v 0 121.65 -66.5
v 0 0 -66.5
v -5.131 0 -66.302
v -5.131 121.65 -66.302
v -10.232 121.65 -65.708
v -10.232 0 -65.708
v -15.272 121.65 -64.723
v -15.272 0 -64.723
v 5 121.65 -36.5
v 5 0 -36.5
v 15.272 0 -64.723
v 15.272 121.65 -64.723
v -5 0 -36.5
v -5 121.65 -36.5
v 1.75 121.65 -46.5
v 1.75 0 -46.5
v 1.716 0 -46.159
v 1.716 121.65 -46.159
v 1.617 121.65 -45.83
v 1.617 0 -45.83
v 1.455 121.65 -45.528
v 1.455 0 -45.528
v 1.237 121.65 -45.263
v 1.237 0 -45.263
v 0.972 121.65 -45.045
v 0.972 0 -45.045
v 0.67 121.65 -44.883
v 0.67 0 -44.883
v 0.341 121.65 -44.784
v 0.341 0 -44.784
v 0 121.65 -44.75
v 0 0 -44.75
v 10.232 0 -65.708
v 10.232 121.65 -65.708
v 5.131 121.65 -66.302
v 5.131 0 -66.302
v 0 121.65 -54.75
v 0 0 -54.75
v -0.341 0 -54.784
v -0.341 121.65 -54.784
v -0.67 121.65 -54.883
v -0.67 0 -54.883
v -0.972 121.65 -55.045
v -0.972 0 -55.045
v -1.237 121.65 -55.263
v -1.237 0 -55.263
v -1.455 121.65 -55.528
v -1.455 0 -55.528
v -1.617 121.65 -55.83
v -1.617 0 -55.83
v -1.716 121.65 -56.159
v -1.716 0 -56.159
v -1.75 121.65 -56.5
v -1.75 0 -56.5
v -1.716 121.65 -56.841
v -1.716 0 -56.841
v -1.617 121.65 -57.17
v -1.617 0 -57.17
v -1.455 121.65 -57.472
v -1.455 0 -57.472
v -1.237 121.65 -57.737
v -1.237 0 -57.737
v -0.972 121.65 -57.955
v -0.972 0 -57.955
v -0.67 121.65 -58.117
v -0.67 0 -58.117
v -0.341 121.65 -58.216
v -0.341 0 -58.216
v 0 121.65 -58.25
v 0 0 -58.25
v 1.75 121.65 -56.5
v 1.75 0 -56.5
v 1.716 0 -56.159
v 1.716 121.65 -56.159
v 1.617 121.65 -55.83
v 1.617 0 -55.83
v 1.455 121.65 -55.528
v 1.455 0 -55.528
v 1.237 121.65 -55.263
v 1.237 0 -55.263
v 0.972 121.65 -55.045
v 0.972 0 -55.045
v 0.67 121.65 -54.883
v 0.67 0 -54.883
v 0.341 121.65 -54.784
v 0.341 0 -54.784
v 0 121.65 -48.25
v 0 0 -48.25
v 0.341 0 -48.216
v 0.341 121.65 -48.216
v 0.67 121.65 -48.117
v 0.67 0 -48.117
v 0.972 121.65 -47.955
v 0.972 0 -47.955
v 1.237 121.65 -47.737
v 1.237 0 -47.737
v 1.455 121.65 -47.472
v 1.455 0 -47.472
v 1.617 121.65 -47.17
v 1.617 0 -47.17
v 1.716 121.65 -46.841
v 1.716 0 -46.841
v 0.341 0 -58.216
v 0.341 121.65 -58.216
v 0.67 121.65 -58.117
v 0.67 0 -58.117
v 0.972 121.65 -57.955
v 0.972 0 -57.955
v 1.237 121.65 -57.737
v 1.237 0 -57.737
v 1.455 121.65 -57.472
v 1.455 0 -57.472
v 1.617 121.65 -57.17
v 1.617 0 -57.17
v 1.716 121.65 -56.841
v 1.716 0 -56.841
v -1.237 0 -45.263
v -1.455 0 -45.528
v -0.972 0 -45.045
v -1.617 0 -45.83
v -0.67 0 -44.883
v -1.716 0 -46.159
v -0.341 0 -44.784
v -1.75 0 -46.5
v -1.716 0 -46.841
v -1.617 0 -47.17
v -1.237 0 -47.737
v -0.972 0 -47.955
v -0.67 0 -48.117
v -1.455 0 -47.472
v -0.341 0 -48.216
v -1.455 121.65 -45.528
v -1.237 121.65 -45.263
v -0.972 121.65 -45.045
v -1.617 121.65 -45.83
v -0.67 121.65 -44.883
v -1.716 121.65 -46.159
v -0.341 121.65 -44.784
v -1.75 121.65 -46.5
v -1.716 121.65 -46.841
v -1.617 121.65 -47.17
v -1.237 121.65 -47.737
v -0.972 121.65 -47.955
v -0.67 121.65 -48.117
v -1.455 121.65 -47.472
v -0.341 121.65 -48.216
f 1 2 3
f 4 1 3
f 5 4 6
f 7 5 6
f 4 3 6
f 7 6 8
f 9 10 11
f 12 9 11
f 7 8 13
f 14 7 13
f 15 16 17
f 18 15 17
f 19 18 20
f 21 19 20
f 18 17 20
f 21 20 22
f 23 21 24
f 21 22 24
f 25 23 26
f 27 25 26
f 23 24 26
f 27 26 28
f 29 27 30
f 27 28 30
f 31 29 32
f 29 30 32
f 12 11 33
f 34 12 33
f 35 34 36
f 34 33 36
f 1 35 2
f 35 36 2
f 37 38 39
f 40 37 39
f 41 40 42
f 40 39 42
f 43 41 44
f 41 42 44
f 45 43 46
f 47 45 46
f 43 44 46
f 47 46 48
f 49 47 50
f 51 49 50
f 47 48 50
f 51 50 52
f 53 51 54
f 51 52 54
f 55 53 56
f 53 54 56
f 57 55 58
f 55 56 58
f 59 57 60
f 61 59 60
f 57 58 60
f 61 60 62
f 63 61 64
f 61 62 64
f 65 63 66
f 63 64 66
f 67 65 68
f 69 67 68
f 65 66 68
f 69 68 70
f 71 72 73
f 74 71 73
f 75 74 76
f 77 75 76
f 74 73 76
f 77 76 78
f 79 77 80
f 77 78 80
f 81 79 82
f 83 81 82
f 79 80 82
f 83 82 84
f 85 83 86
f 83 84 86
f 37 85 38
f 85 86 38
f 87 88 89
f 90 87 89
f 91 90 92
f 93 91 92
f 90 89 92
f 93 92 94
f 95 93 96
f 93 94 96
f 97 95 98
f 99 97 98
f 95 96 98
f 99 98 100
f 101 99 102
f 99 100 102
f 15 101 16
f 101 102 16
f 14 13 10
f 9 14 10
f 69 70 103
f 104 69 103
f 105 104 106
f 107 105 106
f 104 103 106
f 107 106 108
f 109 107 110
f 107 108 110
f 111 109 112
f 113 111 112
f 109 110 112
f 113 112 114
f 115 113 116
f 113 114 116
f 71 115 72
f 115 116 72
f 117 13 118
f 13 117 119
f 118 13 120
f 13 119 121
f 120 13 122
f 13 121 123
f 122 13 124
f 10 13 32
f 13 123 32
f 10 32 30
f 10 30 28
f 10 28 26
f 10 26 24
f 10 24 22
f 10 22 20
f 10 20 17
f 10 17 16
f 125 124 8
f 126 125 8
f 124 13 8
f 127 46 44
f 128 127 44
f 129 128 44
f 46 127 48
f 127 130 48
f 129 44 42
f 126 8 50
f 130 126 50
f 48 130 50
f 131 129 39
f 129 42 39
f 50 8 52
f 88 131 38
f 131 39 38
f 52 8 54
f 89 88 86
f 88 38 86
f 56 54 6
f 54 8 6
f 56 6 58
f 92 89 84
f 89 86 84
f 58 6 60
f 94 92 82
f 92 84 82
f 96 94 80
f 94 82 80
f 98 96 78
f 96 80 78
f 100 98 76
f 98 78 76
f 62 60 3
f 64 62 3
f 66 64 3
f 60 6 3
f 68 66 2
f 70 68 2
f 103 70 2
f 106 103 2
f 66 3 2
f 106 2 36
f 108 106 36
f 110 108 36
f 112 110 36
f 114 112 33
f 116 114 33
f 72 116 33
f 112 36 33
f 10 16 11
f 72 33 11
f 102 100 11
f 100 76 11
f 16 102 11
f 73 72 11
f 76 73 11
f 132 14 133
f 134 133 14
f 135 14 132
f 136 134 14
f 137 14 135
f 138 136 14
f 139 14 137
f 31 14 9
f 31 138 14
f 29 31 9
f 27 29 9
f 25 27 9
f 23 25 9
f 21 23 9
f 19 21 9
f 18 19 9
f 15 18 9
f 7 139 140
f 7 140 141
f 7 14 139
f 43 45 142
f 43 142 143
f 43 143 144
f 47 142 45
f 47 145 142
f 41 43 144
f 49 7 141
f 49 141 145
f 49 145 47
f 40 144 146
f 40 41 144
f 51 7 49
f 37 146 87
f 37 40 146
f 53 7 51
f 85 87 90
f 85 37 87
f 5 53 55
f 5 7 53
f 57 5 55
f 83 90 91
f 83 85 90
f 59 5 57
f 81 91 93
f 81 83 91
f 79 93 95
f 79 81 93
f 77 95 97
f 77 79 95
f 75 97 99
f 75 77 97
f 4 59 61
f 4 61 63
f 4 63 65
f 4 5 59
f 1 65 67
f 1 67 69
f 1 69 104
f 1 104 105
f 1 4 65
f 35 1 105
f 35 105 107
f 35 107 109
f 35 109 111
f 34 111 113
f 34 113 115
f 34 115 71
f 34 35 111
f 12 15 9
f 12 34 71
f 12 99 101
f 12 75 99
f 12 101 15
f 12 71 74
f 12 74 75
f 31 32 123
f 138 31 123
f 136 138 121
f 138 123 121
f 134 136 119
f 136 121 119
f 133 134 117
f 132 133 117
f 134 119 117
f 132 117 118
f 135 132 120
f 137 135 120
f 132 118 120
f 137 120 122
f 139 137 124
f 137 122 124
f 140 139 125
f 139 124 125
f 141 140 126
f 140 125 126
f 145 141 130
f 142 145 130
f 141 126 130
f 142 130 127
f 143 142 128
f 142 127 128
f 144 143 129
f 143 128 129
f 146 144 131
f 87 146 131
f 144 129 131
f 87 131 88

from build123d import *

# Parameters (mm, degrees)
BOSS_EXTRUDE1_DEPTH = 121.65


with BuildPart() as part:
    # Sketch1 → Boss-Extrude1 (new body)
    with BuildSketch(Plane(origin=(0, 0, 0), x_dir=(1, 0, 0), z_dir=(0, 1, 0))):
        with BuildLine():
            Line((-5, 36.5), (0, 36.5))
            Line((0, 36.5), (0, 44.75))
            ThreePointArc((0, 44.75), (-1.75, 46.5), (0, 48.25))
            Line((0, 48.25), (0, 54.75))
            ThreePointArc((0, 54.75), (-1.75, 56.5), (0, 58.25))
            Line((0, 58.25), (0, 66.5))
            ThreePointArc((0, 66.5), (-7.687629304, 66.05414715), (-15.272174355, 64.722567088))
            Line((-15.272174355, 64.722567088), (-5, 36.5))
        make_face()
        with BuildLine():
            Line((0, 44.75), (0, 36.5))
            Line((0, 36.5), (5, 36.5))
            Line((5, 36.5), (15.272174355, 64.722567088))
            ThreePointArc((15.272174355, 64.722567088), (7.687629304, 66.05414715), (0, 66.5))
            Line((0, 66.5), (0, 58.25))
            ThreePointArc((0, 58.25), (1.237436867, 57.737436867), (1.75, 56.5))
            ThreePointArc((1.75, 56.5), (1.237436867, 55.262563133), (0, 54.75))
            Line((0, 54.75), (0, 48.25))
            ThreePointArc((0, 48.25), (1.237436867, 47.737436867), (1.75, 46.5))
            ThreePointArc((1.75, 46.5), (1.237436867, 45.262563133), (0, 44.75))
        make_face()
    extrude(amount=BOSS_EXTRUDE1_DEPTH)


solid = part.part
